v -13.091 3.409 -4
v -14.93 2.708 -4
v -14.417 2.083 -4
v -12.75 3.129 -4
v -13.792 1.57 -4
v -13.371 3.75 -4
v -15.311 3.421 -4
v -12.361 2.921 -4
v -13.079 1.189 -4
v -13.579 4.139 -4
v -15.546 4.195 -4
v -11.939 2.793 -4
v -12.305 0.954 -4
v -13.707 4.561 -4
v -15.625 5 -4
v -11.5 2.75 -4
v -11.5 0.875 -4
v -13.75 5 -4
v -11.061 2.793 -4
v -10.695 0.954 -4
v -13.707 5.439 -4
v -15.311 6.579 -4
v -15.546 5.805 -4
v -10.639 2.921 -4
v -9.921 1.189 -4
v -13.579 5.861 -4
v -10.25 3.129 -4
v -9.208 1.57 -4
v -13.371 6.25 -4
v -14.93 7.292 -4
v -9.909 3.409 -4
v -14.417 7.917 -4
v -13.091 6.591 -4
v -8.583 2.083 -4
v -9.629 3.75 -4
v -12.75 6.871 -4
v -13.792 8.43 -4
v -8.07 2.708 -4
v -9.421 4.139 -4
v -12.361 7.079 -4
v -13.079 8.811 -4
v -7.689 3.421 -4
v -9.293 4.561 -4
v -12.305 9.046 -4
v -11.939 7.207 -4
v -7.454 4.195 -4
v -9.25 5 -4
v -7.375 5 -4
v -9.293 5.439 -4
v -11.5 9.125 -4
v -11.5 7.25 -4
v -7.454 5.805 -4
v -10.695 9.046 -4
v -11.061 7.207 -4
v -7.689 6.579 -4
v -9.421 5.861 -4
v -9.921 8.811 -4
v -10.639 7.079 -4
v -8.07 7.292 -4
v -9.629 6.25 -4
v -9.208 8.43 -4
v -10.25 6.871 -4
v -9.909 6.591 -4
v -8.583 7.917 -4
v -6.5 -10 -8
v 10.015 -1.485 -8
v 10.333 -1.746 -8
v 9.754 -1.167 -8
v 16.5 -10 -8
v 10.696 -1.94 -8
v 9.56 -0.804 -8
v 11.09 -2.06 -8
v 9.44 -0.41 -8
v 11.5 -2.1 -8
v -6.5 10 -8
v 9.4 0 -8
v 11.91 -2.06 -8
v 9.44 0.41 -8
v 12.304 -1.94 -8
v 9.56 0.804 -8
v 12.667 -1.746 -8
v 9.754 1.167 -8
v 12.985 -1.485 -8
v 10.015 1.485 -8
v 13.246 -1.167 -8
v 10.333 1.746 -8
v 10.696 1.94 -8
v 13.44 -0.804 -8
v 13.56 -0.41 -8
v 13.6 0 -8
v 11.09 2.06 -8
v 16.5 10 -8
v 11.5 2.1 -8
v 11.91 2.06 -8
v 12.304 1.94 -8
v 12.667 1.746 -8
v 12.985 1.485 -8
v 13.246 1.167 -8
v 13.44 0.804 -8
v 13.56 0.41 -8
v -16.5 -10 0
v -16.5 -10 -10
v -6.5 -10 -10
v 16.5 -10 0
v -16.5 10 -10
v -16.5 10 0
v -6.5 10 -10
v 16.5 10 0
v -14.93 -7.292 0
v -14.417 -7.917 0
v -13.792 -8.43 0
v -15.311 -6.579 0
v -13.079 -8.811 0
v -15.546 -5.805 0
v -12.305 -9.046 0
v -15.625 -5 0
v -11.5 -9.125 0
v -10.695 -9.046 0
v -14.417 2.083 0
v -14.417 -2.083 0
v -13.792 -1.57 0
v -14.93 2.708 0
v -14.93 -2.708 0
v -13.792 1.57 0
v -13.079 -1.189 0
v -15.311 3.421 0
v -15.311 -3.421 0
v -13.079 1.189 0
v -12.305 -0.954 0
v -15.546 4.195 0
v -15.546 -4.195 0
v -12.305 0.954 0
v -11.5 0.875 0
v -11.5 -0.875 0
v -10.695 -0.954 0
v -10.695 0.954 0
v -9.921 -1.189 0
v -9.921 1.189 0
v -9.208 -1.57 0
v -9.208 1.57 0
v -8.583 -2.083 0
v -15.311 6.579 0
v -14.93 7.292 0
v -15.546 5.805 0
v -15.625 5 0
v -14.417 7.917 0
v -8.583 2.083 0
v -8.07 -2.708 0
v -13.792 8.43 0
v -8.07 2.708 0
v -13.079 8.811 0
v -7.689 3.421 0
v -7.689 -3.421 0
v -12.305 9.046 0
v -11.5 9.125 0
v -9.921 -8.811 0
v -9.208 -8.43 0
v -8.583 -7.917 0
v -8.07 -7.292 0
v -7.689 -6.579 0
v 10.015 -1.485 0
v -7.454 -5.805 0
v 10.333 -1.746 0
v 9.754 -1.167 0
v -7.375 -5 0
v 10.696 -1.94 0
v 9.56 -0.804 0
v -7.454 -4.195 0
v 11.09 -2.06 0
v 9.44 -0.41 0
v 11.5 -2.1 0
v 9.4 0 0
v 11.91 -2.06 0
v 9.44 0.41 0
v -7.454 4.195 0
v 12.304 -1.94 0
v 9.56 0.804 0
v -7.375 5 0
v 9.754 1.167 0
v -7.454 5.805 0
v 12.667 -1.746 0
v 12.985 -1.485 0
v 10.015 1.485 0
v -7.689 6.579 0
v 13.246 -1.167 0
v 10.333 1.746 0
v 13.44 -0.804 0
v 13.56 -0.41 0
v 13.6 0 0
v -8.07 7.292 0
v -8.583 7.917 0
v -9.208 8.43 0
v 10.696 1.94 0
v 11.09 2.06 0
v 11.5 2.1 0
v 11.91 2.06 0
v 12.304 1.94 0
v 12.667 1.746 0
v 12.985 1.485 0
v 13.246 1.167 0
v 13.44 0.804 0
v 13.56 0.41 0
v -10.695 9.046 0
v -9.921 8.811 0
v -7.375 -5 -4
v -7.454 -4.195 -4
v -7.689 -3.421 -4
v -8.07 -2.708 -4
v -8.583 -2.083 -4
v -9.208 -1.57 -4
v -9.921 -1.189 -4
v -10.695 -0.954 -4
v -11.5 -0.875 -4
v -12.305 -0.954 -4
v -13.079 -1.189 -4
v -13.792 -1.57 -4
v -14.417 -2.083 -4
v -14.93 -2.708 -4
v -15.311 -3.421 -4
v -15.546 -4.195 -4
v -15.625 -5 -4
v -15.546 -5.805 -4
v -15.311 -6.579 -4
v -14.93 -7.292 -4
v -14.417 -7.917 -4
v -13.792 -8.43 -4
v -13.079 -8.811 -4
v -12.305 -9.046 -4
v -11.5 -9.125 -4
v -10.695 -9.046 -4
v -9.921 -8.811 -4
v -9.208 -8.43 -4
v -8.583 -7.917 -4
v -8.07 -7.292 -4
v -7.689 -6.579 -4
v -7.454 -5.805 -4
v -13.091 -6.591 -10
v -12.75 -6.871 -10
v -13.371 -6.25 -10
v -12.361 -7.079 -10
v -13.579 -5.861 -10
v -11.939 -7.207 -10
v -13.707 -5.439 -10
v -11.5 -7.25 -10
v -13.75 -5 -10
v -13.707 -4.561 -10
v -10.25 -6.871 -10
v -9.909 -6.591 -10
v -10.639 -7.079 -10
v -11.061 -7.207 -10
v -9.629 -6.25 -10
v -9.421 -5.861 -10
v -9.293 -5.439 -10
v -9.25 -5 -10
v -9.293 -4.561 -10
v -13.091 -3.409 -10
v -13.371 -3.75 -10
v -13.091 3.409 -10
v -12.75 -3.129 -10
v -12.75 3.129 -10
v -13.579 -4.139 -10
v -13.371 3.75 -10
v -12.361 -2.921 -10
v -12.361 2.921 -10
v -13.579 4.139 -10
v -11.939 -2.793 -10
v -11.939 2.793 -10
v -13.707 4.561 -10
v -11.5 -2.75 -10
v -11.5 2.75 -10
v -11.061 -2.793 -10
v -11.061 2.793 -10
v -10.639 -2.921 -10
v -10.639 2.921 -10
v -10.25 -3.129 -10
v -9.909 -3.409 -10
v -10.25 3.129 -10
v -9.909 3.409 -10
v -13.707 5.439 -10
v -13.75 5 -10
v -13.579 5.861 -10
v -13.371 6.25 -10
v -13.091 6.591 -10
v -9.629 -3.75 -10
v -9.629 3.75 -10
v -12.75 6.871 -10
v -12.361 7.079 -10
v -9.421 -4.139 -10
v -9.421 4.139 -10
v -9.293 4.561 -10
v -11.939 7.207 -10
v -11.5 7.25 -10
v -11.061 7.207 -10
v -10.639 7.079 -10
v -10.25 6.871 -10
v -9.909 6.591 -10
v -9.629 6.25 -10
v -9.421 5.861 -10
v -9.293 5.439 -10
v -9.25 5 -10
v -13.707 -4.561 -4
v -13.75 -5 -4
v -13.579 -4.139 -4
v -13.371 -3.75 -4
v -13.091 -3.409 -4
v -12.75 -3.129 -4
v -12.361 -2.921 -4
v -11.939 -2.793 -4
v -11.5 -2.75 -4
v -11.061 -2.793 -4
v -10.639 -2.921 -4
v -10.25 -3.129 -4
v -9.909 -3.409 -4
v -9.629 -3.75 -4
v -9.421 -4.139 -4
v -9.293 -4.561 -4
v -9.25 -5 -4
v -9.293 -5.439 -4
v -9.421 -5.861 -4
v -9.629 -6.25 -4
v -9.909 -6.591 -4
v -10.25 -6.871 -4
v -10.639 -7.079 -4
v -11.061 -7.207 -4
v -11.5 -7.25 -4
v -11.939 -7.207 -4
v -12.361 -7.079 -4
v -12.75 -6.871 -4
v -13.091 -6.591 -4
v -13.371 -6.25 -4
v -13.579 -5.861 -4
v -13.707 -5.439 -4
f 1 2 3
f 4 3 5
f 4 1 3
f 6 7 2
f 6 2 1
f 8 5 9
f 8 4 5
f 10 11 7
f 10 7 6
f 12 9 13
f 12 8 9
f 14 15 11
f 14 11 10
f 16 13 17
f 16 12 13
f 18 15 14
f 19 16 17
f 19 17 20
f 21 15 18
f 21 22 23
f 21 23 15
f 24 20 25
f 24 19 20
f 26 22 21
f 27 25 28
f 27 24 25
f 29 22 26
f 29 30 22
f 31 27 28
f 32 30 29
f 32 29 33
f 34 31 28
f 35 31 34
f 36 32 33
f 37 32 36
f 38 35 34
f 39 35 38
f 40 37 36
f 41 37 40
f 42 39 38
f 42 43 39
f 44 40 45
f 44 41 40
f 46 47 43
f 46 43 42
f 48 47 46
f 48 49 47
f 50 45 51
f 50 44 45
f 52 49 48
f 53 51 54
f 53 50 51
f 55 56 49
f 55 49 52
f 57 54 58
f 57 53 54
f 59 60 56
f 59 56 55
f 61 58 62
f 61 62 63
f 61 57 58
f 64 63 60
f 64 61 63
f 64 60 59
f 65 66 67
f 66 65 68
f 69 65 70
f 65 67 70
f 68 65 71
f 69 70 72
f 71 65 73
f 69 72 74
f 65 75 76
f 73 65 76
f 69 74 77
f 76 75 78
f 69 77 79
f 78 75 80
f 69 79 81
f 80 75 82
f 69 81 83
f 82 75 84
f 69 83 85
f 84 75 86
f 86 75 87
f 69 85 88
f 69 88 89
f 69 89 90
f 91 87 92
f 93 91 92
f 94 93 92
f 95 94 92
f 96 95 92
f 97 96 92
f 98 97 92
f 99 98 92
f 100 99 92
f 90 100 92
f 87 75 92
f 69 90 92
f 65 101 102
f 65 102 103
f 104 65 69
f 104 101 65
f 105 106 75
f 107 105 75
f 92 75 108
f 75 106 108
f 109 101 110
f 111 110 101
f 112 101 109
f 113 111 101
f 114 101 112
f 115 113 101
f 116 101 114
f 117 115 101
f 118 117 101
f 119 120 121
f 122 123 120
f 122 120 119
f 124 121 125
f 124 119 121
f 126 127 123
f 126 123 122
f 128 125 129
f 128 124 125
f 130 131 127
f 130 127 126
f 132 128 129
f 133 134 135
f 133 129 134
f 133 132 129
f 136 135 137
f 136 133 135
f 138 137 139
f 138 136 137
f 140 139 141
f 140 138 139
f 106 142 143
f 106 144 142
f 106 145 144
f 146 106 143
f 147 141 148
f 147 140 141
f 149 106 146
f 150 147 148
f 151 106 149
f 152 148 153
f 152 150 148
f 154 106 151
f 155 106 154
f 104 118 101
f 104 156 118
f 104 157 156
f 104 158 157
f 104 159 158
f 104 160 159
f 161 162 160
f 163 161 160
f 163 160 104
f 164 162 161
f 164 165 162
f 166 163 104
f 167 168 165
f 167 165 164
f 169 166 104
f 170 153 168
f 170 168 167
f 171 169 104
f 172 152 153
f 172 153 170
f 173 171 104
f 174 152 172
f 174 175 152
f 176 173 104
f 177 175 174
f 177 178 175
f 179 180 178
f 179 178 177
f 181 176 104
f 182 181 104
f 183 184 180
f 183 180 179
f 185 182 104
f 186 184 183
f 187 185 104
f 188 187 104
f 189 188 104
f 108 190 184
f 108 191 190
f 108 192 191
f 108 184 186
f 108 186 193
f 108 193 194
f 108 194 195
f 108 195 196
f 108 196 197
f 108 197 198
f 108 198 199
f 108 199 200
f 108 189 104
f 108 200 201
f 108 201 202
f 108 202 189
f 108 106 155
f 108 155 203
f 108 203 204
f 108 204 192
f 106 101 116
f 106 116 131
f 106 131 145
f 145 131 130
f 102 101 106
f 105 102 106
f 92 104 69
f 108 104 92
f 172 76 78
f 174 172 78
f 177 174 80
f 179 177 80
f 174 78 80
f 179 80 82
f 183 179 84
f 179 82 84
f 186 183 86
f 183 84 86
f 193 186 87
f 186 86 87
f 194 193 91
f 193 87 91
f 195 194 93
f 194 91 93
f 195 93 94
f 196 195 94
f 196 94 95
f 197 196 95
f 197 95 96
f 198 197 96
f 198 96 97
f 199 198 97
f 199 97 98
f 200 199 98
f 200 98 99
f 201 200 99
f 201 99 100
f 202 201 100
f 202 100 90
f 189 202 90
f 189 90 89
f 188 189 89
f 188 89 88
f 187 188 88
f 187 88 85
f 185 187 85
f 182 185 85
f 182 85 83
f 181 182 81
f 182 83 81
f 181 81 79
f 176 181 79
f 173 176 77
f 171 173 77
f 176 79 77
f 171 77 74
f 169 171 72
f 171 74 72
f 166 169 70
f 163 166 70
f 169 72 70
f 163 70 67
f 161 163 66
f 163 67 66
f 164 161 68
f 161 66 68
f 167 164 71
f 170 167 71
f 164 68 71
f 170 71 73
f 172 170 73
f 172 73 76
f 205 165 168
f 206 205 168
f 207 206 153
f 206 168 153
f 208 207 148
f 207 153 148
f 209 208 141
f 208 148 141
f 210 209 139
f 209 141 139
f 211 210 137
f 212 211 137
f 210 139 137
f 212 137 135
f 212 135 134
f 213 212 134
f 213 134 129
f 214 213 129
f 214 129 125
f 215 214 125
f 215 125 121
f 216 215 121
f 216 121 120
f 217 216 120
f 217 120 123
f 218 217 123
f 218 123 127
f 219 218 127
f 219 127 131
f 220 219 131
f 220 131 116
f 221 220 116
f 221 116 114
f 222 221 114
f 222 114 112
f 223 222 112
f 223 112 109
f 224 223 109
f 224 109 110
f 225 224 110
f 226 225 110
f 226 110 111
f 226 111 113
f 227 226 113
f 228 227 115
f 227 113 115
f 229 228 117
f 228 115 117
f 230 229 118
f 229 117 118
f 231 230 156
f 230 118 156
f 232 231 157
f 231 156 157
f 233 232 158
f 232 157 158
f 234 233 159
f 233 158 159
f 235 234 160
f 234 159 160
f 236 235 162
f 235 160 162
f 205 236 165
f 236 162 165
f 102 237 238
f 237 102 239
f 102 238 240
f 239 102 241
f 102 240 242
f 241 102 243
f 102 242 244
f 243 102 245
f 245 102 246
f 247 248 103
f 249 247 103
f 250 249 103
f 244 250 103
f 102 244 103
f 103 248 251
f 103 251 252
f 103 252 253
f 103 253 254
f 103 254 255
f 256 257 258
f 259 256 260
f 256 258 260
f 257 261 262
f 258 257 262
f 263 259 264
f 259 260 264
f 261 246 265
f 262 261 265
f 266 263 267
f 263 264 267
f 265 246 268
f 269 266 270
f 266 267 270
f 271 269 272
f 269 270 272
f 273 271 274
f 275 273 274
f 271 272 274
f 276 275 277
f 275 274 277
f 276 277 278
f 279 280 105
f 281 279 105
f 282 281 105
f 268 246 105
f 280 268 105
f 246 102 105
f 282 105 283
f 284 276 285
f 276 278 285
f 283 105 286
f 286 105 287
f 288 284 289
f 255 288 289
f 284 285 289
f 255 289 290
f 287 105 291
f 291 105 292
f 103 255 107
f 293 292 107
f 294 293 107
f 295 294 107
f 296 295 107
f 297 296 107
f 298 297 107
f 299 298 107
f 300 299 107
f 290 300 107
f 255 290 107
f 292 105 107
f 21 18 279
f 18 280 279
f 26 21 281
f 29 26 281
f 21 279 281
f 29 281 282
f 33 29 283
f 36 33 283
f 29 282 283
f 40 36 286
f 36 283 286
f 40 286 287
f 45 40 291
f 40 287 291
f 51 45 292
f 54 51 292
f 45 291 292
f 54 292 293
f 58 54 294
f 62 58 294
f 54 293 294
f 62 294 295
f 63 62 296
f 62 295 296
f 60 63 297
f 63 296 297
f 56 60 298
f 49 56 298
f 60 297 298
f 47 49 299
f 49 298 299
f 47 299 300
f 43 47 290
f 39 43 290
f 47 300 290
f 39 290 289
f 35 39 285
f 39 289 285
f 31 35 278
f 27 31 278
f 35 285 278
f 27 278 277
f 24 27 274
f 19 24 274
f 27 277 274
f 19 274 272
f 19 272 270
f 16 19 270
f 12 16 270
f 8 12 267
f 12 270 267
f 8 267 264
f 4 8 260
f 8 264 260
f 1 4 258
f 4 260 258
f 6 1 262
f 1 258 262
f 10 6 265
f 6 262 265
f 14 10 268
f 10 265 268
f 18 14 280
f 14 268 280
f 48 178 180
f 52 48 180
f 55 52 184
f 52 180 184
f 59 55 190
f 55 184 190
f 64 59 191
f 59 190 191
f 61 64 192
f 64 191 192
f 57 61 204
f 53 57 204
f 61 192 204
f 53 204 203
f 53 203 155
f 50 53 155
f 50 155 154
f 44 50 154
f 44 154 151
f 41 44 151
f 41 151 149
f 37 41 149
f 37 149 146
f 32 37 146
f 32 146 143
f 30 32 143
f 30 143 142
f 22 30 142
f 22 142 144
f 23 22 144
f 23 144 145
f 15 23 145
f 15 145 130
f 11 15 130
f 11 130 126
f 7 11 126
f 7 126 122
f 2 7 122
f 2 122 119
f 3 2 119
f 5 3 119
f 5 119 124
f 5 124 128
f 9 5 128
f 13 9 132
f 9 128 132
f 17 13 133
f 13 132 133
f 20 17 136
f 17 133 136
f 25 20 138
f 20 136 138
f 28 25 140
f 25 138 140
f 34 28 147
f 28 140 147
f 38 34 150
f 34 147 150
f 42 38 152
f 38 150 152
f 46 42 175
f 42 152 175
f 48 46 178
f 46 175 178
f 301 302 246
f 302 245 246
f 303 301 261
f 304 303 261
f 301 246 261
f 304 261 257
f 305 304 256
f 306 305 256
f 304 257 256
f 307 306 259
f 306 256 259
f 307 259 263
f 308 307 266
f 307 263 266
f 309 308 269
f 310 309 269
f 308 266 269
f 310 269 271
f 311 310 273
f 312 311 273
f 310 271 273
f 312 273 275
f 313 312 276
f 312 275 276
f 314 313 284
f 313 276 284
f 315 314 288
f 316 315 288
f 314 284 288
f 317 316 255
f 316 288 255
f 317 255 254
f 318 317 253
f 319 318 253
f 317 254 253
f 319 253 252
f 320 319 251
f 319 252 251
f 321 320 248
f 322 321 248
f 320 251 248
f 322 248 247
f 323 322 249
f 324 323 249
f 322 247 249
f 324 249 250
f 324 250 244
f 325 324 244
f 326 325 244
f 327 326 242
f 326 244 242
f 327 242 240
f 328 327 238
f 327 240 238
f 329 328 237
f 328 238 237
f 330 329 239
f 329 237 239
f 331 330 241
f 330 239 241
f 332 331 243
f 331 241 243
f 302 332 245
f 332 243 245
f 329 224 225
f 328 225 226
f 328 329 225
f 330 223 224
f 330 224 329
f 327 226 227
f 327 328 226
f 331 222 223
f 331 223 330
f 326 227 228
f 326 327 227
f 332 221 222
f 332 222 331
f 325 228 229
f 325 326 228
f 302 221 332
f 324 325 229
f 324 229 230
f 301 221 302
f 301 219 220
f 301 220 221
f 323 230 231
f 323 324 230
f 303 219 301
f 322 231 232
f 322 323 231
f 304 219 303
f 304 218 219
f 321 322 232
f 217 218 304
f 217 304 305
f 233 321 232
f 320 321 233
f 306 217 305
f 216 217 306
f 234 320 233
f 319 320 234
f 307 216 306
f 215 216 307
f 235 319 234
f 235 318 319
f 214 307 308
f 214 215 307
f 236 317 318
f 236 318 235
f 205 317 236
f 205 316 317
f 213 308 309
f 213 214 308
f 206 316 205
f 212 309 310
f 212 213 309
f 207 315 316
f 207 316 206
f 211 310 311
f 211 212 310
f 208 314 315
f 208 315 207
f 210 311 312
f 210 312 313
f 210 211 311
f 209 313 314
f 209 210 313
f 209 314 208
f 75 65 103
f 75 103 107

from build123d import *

# Parameters (mm, degrees)
F0_W           = 10
F0_H           = 20
F1_DEPTH       = 10
F0_W_2         = 23
F2_DEPTH       = 8
F3_D           = 4.2
F4_D           = 4.5
F4_CBORE_D     = 8.25
F4_CBORE_DEPTH = 4


with BuildPart() as f1:
    # F0 (on Top) → F1 (new body)
    with BuildSketch(Plane.XY):
        with Locations((-11.5, 0)):
            Rectangle(F0_W, F0_H)
    extrude(amount=-F1_DEPTH)

    # F0 (on Top) → F2 (join)
    with BuildSketch(Plane.XY):
        with Locations((5, 0)):
            Rectangle(F0_W_2, F0_H)
    extrude(amount=-F2_DEPTH)

    # F3 (through all)
    with Locations(Plane.XY):
        with Locations((11.5, 0)):
            Hole(F3_D / 2)

    # F4 (through all)
    with Locations(Plane.XY):
        with Locations((-11.5, 5), (-11.5, -5)):
            CounterBoreHole(F4_D / 2, F4_CBORE_D / 2, F4_CBORE_DEPTH)


solid = f1.part
